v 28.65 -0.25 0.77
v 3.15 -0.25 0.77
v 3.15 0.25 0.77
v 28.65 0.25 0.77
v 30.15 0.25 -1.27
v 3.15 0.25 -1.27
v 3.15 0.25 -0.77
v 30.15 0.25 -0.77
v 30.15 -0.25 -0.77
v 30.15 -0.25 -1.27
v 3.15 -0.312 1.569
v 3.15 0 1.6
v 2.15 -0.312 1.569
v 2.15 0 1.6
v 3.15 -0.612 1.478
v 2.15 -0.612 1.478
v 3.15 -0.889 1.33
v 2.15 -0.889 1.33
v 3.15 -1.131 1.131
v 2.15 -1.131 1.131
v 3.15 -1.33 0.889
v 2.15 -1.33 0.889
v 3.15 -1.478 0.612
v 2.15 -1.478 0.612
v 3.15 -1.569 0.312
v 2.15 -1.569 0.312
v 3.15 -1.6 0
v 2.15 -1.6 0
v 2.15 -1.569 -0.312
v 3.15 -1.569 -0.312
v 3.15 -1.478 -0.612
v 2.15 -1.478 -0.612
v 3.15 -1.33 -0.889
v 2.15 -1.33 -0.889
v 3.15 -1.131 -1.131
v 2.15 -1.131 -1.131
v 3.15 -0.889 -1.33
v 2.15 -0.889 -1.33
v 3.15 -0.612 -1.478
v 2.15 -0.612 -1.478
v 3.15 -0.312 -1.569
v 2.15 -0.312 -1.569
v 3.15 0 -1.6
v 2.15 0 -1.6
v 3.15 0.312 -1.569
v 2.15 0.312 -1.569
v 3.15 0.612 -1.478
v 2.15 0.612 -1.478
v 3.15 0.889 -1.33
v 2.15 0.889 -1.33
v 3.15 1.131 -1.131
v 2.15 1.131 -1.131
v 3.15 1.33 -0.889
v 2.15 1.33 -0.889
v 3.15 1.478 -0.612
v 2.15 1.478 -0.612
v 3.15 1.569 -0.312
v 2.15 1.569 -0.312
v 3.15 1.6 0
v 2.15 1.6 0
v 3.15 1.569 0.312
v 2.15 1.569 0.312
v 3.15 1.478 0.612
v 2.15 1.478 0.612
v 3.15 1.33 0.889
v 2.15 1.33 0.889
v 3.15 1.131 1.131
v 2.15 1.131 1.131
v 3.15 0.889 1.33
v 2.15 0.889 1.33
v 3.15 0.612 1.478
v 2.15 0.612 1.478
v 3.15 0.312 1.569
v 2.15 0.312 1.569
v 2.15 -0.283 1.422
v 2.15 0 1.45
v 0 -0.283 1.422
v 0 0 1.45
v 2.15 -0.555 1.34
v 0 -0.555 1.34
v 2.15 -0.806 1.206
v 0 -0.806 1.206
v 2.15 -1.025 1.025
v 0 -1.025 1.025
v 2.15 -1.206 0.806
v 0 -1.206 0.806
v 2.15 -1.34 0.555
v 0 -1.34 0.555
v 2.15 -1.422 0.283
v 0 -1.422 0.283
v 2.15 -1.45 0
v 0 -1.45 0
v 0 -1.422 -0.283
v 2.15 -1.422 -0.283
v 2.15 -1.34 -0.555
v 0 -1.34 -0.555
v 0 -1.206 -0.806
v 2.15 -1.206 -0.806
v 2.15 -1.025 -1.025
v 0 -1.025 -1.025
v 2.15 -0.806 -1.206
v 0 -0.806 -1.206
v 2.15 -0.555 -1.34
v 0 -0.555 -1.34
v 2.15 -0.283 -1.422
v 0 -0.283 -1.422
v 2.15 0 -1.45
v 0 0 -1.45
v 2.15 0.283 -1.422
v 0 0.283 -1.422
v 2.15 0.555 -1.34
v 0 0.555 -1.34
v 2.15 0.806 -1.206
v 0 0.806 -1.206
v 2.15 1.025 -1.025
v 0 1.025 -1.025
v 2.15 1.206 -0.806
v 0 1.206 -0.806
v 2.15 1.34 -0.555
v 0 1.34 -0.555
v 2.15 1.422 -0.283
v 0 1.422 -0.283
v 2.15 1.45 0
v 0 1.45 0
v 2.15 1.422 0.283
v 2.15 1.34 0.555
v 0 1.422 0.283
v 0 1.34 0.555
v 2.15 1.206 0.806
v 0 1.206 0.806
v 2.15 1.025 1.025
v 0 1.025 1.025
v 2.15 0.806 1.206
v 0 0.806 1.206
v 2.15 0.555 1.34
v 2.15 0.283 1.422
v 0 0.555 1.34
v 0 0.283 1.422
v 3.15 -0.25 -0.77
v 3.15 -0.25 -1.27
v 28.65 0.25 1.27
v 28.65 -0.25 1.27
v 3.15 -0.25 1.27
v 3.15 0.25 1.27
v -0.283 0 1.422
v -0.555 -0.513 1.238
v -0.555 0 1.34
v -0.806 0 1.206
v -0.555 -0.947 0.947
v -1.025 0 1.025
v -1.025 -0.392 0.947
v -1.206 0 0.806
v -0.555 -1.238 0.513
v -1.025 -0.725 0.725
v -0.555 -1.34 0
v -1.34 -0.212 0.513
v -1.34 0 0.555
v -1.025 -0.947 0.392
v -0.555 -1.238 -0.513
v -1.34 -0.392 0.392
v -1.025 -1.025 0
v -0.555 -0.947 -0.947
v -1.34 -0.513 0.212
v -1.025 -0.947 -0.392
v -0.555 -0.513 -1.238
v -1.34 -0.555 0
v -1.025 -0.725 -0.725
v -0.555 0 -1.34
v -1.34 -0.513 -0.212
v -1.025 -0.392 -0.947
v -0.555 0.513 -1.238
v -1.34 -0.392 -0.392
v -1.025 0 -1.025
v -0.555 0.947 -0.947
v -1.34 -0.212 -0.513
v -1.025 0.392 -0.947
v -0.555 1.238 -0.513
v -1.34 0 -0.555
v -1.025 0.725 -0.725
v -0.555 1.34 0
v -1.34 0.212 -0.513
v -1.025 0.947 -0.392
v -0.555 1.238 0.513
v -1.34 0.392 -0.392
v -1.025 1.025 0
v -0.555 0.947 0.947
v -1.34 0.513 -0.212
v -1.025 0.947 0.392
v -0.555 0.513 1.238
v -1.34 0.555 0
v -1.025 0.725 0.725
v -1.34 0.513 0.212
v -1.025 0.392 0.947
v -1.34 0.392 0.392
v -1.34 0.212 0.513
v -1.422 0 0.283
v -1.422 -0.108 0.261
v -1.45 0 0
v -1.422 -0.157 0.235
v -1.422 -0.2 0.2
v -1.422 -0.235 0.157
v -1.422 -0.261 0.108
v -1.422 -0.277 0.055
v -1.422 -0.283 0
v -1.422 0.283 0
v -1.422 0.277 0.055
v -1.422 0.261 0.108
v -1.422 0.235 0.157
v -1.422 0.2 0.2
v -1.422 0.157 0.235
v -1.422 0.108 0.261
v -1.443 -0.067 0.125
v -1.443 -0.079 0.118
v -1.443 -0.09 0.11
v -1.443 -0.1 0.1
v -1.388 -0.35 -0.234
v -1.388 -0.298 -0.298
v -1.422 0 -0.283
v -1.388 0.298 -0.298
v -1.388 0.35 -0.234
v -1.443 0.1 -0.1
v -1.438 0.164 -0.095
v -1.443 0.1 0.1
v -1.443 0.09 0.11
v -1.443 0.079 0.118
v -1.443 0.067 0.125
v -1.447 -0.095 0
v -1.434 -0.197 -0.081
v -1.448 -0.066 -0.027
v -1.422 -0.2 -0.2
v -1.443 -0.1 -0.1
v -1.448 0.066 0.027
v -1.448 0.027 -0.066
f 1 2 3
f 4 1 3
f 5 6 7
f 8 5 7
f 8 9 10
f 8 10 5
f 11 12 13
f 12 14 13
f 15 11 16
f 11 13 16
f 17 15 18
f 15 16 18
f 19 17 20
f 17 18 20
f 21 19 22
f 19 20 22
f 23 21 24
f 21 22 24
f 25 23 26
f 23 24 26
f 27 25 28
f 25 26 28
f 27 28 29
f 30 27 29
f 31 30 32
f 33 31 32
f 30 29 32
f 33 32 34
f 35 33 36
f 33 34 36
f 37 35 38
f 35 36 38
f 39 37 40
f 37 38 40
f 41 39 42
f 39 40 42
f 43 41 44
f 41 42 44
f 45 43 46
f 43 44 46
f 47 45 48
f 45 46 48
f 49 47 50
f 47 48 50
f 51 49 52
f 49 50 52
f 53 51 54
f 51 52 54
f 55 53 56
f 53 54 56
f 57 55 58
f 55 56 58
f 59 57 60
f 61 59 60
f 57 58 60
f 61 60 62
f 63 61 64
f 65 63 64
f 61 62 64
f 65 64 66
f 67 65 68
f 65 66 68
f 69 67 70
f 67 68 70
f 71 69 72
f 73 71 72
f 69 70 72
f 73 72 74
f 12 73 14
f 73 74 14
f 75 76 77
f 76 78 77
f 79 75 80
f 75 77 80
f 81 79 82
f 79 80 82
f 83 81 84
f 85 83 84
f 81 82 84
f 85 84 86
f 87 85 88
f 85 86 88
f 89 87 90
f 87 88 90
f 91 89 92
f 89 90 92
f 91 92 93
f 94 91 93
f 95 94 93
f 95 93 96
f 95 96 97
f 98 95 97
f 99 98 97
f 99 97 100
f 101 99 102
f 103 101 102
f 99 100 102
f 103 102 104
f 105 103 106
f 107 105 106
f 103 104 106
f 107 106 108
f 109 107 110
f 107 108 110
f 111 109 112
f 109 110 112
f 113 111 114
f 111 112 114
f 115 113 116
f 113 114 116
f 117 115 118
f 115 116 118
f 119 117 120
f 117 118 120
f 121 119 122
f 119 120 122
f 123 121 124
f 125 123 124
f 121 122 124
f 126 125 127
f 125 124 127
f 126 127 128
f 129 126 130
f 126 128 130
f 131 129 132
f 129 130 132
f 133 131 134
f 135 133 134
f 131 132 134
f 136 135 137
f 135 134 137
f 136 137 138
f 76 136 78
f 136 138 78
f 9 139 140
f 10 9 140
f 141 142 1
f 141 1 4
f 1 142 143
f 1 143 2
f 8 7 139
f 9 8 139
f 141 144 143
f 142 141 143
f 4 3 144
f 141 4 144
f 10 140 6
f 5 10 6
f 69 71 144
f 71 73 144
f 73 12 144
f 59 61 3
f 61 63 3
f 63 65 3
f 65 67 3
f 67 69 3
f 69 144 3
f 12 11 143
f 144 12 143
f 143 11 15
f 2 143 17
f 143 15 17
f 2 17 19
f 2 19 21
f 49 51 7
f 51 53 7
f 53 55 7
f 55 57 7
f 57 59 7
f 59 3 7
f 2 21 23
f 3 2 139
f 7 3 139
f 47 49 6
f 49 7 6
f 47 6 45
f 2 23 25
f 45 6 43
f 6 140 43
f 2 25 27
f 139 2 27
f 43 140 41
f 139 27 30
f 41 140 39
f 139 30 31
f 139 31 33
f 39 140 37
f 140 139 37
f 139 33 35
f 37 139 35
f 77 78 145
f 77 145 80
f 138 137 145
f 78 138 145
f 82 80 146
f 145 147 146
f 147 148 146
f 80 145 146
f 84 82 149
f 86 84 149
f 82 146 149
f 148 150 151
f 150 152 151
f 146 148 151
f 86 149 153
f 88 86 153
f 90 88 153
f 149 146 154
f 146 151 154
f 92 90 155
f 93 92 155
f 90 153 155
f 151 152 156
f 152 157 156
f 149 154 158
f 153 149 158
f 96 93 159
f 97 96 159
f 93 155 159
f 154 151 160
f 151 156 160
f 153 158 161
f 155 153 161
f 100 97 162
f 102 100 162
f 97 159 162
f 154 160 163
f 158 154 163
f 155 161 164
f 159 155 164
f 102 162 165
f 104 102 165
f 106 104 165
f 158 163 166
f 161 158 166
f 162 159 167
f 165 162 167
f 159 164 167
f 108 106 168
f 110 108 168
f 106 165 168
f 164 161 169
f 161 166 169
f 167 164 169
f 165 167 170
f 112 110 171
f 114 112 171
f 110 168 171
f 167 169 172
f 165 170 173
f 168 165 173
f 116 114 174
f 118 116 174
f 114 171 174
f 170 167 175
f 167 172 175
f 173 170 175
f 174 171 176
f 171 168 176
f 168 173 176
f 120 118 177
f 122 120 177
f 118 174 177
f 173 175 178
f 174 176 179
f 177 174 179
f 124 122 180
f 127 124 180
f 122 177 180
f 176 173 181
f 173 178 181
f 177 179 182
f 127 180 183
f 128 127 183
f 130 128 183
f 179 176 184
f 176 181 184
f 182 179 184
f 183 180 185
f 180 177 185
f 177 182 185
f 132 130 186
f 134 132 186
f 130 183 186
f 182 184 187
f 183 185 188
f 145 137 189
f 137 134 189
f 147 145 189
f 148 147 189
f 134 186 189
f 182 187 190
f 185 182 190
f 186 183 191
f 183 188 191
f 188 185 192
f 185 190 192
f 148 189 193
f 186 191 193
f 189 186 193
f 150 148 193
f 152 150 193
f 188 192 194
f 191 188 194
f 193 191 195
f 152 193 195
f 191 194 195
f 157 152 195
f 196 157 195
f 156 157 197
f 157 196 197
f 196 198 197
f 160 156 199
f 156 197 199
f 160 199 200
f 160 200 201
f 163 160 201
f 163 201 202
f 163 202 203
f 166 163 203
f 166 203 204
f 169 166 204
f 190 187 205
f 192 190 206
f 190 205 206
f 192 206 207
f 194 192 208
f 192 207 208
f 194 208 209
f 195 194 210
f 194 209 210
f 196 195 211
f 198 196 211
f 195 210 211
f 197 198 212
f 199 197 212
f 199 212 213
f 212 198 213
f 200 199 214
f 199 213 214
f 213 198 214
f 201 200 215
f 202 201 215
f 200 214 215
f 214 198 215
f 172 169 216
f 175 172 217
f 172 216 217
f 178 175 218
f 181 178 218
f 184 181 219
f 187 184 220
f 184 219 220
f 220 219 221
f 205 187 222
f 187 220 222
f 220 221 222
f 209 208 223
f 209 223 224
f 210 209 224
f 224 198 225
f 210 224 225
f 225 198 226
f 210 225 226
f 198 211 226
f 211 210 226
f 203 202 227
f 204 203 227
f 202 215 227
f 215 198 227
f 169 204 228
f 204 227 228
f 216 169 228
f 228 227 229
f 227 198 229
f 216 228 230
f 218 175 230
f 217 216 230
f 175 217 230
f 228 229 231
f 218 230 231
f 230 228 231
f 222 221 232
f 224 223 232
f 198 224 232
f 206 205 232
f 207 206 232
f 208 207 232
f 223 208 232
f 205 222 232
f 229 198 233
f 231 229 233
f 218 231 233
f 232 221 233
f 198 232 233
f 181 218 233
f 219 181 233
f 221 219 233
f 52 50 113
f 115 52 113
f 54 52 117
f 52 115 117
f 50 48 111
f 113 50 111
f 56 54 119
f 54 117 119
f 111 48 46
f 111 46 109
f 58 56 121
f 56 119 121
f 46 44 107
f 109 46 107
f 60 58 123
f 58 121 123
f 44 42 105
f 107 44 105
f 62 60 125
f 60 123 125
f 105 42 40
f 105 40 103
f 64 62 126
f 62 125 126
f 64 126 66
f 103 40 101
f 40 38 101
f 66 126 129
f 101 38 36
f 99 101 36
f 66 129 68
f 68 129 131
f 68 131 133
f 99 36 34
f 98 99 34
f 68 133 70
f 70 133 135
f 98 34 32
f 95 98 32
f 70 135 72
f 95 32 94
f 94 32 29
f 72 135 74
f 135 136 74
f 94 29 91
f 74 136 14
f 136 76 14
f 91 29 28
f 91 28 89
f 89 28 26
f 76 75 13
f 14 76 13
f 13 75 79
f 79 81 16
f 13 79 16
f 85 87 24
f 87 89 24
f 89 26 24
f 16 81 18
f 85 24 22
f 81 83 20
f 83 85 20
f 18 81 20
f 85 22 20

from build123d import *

# Parameters (mm, degrees)
F3_DEPTH  = 27
F3_FACE_W = 0.5
F3_FACE_H = 0.5
F4_DEPTH  = 1.5


with BuildPart() as f1:
    # F0 (on Front) → F1 (revolve)
    with BuildSketch(Plane.XZ):
        with BuildLine():
            Line((2.15, 1.45), (0, 1.45))
            ThreePointArc((0, 1.45), (-1.025305, 1.025305), (-1.45, 0))
            Line((-1.45, 0), (3.15, 0))
            Line((3.15, 0), (3.15, 1.6))
            Line((3.15, 1.6), (2.15, 1.6))
            Line((2.15, 1.6), (2.15, 1.45))
        make_face()
    revolve(axis=Axis((4.33001, 0, 0), (1, 0, 0)))

    # F2 (on face) → F3 (join)
    with BuildSketch(Plane.YZ.offset(3.15)):
        Polygon((0.25, -0.77), (-0.25, -0.77), (-0.25, -1.27), (0, -1.27), (0.25, -1.27), align=None)
        Polygon((0.25, 1.27), (0, 1.27), (-0.25, 1.27), (-0.25, 0.77), (0.25, 0.77), align=None)
    extrude(amount=F3_DEPTH)

    # F3_face (on face) → F4 (cut)
    with BuildSketch(Plane(origin=(30.15, 0, 1.02), x_dir=(0, 1, 0), z_dir=(1, 0, 0))):
        Rectangle(F3_FACE_W, F3_FACE_H)
    extrude(amount=-F4_DEPTH, mode=Mode.SUBTRACT)


solid = f1.part
